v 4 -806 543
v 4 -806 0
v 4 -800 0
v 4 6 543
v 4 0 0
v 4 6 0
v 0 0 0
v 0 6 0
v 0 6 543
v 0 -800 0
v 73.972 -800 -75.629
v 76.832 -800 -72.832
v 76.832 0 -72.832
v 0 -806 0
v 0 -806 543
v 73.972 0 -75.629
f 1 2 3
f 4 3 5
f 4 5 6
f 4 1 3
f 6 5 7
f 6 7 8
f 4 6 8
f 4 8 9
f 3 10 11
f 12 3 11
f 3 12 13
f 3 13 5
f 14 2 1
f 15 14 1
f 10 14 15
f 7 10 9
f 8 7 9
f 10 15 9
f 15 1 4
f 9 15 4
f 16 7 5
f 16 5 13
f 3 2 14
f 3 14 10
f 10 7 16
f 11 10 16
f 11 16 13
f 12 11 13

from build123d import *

# Parameters (mm, degrees)
F0_W     = 4
F0_H     = 543
F1_DEPTH = 800
F2_W     = 6
F2_H     = 543
F3_DEPTH = 4


with BuildPart() as f1:
    # F0 (on Front) → F1 (new body)
    with BuildSketch(Plane.XZ):
        with Locations((2, 271.5)):
            Rectangle(F0_W, F0_H)
        Polygon((4, 0), (0, 0), (73.972428, -75.628935), (76.831998, -72.831998), align=None)
    extrude(amount=F1_DEPTH)

    # F2 (on face) → F3 (join)
    with BuildSketch(Plane.YZ.offset(4)):
        with Locations((-803, 271.5)):
            Rectangle(F2_W, F2_H)
        with Locations((3, 271.5)):
            Rectangle(F2_W, F2_H)
    extrude(amount=-F3_DEPTH)


solid = f1.part
